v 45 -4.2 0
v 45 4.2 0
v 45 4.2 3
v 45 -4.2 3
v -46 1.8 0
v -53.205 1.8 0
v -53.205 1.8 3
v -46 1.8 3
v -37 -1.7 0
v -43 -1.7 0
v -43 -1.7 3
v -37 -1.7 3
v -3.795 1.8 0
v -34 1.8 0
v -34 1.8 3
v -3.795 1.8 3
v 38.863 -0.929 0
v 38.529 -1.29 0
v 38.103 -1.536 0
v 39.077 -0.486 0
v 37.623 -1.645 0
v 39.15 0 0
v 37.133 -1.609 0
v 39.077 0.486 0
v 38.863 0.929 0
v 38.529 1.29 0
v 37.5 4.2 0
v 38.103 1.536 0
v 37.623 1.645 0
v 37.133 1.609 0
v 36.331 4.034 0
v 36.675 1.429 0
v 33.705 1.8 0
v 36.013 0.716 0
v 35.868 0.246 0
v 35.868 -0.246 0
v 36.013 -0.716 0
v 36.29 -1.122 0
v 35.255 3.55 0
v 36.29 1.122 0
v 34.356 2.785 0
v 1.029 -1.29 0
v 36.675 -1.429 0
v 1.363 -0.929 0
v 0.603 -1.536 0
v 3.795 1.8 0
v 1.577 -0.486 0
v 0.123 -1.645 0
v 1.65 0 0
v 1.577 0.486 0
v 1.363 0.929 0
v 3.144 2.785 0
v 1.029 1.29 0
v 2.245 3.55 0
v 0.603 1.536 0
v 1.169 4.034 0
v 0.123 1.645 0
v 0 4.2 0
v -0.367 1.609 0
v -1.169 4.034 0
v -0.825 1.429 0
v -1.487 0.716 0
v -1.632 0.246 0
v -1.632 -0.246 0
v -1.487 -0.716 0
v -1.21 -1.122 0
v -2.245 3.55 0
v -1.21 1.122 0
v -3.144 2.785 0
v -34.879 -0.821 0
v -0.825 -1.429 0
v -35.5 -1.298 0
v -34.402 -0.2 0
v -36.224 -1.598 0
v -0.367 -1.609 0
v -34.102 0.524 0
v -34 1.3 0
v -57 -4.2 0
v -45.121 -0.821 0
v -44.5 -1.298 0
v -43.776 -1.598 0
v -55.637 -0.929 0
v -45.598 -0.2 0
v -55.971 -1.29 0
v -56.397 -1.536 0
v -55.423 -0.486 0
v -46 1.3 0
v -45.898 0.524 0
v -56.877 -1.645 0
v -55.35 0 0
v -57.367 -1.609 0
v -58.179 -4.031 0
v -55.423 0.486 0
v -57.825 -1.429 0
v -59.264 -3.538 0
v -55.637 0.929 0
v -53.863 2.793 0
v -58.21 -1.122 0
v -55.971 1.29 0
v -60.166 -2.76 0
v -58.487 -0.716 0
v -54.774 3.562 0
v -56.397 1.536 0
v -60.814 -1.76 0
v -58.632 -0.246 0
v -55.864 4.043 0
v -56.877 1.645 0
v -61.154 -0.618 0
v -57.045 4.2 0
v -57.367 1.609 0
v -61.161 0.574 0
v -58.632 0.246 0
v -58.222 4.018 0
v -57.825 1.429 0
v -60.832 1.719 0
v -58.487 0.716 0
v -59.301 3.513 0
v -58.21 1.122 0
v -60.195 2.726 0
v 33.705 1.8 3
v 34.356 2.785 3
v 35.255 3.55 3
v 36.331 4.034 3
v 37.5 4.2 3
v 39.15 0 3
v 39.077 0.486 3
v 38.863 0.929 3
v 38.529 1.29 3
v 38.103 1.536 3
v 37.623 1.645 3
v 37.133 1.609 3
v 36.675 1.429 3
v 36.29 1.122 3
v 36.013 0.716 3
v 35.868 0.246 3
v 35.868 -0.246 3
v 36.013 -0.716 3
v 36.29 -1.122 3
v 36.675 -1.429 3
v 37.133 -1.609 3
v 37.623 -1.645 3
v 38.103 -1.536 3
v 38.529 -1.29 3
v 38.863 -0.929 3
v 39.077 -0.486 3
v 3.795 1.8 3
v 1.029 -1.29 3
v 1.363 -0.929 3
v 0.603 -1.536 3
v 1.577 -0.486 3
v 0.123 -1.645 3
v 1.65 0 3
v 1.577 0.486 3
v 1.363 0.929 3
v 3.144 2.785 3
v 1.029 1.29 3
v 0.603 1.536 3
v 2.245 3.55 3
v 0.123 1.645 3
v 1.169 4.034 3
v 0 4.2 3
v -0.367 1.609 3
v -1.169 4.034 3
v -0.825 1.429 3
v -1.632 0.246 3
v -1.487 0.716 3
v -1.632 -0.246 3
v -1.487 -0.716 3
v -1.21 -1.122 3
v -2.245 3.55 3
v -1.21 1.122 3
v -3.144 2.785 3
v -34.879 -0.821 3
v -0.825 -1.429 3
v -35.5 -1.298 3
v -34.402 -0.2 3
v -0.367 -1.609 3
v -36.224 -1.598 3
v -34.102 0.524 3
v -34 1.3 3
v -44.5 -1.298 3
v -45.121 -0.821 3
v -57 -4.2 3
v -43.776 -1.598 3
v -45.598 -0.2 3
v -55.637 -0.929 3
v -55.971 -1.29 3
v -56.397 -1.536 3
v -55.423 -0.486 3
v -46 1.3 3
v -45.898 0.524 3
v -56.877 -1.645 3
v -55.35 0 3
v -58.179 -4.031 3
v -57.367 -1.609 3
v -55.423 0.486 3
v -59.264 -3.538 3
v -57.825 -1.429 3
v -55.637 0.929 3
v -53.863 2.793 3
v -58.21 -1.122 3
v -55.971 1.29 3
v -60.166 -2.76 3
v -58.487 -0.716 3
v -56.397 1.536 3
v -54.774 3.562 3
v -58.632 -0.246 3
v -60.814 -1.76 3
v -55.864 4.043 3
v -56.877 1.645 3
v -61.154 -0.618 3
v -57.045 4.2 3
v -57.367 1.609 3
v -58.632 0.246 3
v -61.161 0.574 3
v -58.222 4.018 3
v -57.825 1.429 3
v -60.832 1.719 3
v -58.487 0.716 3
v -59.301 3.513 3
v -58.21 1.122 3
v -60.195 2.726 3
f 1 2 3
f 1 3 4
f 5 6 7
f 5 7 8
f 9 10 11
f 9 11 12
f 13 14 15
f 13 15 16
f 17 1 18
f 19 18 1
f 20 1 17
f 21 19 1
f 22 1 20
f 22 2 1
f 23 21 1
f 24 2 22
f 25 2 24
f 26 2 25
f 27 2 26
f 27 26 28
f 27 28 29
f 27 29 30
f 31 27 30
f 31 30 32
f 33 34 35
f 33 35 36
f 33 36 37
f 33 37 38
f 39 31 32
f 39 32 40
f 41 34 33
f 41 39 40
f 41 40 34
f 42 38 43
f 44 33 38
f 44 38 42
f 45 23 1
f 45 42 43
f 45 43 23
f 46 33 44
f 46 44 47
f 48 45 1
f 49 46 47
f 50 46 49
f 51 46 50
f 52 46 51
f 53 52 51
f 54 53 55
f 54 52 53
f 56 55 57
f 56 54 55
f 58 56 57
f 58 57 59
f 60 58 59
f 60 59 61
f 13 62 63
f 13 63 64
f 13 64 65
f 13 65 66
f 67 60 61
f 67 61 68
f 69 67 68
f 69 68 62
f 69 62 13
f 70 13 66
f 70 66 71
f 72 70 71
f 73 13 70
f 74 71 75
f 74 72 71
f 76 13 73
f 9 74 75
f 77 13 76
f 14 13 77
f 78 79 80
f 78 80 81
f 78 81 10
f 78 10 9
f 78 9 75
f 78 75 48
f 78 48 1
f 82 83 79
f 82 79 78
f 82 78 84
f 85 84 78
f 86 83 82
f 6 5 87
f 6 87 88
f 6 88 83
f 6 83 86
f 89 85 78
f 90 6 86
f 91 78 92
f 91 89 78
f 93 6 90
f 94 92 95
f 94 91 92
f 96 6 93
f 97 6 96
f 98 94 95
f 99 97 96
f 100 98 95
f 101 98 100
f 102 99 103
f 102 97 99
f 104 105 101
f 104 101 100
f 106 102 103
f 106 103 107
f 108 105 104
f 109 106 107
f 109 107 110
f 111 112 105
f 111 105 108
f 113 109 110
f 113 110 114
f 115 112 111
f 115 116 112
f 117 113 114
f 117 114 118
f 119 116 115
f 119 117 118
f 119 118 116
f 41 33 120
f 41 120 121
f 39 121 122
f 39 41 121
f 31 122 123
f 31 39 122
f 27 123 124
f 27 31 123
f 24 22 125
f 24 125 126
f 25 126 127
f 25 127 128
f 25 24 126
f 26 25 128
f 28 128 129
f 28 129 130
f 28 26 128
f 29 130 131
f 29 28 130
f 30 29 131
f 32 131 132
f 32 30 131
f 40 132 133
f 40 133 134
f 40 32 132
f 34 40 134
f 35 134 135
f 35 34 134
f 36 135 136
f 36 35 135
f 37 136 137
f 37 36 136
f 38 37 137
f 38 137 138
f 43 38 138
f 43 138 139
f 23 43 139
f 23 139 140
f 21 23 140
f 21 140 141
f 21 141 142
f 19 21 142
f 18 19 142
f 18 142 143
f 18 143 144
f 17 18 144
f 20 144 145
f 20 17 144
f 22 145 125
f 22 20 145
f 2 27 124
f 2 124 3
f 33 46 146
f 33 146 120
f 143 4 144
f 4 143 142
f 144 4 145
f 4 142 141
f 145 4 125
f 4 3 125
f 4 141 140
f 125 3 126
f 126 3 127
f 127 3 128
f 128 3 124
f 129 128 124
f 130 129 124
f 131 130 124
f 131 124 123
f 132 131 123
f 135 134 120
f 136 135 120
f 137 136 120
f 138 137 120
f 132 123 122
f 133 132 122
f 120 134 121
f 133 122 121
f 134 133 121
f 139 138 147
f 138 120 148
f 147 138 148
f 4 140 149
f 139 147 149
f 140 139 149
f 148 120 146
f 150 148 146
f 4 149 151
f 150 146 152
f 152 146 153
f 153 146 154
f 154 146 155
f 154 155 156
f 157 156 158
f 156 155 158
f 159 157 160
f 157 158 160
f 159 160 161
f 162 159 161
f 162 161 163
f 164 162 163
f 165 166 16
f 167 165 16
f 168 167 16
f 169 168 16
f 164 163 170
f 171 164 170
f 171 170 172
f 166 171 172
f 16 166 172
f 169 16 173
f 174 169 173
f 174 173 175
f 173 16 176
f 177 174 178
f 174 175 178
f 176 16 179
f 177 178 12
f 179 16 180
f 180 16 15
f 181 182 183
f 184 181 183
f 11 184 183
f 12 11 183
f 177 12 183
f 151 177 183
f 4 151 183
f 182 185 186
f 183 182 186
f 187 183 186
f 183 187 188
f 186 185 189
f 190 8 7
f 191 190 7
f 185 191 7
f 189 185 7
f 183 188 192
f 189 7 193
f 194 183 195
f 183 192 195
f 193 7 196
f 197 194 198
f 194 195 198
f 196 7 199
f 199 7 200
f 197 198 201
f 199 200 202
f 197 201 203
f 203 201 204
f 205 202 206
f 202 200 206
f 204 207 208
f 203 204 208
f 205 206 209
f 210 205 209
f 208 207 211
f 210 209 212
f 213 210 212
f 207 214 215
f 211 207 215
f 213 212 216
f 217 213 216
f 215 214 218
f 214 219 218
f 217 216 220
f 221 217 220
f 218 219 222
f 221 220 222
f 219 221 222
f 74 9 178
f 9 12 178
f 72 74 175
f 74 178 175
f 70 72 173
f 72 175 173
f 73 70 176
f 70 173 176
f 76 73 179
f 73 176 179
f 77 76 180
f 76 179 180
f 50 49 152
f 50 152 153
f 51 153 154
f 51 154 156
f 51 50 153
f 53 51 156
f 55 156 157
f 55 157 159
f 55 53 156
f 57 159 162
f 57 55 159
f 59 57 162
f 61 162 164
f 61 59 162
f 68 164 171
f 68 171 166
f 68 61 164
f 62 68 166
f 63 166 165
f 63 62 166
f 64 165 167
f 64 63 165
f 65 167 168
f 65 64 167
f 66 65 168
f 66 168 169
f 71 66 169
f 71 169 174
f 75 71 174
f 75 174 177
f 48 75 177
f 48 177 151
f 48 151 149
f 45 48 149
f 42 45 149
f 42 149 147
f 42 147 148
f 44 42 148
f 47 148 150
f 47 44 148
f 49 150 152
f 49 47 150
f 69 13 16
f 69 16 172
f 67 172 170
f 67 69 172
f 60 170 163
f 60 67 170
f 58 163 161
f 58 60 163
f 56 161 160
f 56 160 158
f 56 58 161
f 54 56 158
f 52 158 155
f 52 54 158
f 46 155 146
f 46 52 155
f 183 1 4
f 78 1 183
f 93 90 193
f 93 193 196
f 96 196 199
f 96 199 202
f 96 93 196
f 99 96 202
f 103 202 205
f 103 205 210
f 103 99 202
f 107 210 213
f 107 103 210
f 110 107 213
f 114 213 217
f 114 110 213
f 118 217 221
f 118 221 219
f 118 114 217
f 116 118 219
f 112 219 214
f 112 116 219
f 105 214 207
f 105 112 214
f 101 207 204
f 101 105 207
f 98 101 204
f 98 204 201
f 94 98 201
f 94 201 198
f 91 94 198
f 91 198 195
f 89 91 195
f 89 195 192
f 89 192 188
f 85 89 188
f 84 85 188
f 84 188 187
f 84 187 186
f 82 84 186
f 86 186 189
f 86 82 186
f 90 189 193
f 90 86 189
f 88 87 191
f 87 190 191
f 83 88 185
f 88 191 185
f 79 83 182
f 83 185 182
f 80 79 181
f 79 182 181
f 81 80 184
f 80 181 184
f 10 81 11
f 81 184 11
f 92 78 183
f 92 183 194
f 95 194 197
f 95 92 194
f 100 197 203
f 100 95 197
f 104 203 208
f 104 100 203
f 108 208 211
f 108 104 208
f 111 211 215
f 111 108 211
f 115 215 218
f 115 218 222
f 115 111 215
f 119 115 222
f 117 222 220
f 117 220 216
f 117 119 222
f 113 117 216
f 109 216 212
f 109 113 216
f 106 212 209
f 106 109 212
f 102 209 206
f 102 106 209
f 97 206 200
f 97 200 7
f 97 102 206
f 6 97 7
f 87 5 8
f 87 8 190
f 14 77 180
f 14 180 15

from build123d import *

# Parameters (mm, degrees)
SKETCH1_R           = 1.65
BOSS_EXTRUDE1_DEPTH = 3
FILLET1_R           = 3


with BuildPart() as part:
    # Sketch1 → Boss-Extrude1 (new body)
    with BuildSketch(Plane.XY):
        with BuildLine():
            Line((-53.205266808, 1.8), (-46, 1.8))
            Line((-46, 1.8), (-46, -1.7))
            Line((-46, -1.7), (-34, -1.7))
            Line((-34, -1.7), (-34, 1.8))
            Line((-34, 1.8), (-3.794733192, 1.8))
            ThreePointArc((-3.794733192, 1.8), (0, 4.2), (3.794733192, 1.8))
            Line((3.794733192, 1.8), (33.705266808, 1.8))
            ThreePointArc((33.705266808, 1.8), (35.255005568, 3.54964787), (37.5, 4.2))
            Line((37.5, 4.2), (45, 4.2))
            Line((45, 4.2), (45, -4.2))
            Line((45, -4.2), (-57, -4.2))
            ThreePointArc((-57, -4.2), (-60.54964787, 2.244994432), (-53.205266808, 1.8))
        make_face()
        Circle(SKETCH1_R, mode=Mode.SUBTRACT)
        with Locations((-57, 0)):
            Circle(SKETCH1_R, mode=Mode.SUBTRACT)
        with Locations((37.5, 0)):
            Circle(SKETCH1_R, mode=Mode.SUBTRACT)
    extrude(amount=BOSS_EXTRUDE1_DEPTH)

    # Fillet1
    fillet1_edges = [part.edges().sort_by_distance(p)[0] for p in [
        (-46, -1.7, 1.5),
        (-34, -1.7, 1.5),
    ]]
    fillet(fillet1_edges, radius=FILLET1_R)


solid = part.part
